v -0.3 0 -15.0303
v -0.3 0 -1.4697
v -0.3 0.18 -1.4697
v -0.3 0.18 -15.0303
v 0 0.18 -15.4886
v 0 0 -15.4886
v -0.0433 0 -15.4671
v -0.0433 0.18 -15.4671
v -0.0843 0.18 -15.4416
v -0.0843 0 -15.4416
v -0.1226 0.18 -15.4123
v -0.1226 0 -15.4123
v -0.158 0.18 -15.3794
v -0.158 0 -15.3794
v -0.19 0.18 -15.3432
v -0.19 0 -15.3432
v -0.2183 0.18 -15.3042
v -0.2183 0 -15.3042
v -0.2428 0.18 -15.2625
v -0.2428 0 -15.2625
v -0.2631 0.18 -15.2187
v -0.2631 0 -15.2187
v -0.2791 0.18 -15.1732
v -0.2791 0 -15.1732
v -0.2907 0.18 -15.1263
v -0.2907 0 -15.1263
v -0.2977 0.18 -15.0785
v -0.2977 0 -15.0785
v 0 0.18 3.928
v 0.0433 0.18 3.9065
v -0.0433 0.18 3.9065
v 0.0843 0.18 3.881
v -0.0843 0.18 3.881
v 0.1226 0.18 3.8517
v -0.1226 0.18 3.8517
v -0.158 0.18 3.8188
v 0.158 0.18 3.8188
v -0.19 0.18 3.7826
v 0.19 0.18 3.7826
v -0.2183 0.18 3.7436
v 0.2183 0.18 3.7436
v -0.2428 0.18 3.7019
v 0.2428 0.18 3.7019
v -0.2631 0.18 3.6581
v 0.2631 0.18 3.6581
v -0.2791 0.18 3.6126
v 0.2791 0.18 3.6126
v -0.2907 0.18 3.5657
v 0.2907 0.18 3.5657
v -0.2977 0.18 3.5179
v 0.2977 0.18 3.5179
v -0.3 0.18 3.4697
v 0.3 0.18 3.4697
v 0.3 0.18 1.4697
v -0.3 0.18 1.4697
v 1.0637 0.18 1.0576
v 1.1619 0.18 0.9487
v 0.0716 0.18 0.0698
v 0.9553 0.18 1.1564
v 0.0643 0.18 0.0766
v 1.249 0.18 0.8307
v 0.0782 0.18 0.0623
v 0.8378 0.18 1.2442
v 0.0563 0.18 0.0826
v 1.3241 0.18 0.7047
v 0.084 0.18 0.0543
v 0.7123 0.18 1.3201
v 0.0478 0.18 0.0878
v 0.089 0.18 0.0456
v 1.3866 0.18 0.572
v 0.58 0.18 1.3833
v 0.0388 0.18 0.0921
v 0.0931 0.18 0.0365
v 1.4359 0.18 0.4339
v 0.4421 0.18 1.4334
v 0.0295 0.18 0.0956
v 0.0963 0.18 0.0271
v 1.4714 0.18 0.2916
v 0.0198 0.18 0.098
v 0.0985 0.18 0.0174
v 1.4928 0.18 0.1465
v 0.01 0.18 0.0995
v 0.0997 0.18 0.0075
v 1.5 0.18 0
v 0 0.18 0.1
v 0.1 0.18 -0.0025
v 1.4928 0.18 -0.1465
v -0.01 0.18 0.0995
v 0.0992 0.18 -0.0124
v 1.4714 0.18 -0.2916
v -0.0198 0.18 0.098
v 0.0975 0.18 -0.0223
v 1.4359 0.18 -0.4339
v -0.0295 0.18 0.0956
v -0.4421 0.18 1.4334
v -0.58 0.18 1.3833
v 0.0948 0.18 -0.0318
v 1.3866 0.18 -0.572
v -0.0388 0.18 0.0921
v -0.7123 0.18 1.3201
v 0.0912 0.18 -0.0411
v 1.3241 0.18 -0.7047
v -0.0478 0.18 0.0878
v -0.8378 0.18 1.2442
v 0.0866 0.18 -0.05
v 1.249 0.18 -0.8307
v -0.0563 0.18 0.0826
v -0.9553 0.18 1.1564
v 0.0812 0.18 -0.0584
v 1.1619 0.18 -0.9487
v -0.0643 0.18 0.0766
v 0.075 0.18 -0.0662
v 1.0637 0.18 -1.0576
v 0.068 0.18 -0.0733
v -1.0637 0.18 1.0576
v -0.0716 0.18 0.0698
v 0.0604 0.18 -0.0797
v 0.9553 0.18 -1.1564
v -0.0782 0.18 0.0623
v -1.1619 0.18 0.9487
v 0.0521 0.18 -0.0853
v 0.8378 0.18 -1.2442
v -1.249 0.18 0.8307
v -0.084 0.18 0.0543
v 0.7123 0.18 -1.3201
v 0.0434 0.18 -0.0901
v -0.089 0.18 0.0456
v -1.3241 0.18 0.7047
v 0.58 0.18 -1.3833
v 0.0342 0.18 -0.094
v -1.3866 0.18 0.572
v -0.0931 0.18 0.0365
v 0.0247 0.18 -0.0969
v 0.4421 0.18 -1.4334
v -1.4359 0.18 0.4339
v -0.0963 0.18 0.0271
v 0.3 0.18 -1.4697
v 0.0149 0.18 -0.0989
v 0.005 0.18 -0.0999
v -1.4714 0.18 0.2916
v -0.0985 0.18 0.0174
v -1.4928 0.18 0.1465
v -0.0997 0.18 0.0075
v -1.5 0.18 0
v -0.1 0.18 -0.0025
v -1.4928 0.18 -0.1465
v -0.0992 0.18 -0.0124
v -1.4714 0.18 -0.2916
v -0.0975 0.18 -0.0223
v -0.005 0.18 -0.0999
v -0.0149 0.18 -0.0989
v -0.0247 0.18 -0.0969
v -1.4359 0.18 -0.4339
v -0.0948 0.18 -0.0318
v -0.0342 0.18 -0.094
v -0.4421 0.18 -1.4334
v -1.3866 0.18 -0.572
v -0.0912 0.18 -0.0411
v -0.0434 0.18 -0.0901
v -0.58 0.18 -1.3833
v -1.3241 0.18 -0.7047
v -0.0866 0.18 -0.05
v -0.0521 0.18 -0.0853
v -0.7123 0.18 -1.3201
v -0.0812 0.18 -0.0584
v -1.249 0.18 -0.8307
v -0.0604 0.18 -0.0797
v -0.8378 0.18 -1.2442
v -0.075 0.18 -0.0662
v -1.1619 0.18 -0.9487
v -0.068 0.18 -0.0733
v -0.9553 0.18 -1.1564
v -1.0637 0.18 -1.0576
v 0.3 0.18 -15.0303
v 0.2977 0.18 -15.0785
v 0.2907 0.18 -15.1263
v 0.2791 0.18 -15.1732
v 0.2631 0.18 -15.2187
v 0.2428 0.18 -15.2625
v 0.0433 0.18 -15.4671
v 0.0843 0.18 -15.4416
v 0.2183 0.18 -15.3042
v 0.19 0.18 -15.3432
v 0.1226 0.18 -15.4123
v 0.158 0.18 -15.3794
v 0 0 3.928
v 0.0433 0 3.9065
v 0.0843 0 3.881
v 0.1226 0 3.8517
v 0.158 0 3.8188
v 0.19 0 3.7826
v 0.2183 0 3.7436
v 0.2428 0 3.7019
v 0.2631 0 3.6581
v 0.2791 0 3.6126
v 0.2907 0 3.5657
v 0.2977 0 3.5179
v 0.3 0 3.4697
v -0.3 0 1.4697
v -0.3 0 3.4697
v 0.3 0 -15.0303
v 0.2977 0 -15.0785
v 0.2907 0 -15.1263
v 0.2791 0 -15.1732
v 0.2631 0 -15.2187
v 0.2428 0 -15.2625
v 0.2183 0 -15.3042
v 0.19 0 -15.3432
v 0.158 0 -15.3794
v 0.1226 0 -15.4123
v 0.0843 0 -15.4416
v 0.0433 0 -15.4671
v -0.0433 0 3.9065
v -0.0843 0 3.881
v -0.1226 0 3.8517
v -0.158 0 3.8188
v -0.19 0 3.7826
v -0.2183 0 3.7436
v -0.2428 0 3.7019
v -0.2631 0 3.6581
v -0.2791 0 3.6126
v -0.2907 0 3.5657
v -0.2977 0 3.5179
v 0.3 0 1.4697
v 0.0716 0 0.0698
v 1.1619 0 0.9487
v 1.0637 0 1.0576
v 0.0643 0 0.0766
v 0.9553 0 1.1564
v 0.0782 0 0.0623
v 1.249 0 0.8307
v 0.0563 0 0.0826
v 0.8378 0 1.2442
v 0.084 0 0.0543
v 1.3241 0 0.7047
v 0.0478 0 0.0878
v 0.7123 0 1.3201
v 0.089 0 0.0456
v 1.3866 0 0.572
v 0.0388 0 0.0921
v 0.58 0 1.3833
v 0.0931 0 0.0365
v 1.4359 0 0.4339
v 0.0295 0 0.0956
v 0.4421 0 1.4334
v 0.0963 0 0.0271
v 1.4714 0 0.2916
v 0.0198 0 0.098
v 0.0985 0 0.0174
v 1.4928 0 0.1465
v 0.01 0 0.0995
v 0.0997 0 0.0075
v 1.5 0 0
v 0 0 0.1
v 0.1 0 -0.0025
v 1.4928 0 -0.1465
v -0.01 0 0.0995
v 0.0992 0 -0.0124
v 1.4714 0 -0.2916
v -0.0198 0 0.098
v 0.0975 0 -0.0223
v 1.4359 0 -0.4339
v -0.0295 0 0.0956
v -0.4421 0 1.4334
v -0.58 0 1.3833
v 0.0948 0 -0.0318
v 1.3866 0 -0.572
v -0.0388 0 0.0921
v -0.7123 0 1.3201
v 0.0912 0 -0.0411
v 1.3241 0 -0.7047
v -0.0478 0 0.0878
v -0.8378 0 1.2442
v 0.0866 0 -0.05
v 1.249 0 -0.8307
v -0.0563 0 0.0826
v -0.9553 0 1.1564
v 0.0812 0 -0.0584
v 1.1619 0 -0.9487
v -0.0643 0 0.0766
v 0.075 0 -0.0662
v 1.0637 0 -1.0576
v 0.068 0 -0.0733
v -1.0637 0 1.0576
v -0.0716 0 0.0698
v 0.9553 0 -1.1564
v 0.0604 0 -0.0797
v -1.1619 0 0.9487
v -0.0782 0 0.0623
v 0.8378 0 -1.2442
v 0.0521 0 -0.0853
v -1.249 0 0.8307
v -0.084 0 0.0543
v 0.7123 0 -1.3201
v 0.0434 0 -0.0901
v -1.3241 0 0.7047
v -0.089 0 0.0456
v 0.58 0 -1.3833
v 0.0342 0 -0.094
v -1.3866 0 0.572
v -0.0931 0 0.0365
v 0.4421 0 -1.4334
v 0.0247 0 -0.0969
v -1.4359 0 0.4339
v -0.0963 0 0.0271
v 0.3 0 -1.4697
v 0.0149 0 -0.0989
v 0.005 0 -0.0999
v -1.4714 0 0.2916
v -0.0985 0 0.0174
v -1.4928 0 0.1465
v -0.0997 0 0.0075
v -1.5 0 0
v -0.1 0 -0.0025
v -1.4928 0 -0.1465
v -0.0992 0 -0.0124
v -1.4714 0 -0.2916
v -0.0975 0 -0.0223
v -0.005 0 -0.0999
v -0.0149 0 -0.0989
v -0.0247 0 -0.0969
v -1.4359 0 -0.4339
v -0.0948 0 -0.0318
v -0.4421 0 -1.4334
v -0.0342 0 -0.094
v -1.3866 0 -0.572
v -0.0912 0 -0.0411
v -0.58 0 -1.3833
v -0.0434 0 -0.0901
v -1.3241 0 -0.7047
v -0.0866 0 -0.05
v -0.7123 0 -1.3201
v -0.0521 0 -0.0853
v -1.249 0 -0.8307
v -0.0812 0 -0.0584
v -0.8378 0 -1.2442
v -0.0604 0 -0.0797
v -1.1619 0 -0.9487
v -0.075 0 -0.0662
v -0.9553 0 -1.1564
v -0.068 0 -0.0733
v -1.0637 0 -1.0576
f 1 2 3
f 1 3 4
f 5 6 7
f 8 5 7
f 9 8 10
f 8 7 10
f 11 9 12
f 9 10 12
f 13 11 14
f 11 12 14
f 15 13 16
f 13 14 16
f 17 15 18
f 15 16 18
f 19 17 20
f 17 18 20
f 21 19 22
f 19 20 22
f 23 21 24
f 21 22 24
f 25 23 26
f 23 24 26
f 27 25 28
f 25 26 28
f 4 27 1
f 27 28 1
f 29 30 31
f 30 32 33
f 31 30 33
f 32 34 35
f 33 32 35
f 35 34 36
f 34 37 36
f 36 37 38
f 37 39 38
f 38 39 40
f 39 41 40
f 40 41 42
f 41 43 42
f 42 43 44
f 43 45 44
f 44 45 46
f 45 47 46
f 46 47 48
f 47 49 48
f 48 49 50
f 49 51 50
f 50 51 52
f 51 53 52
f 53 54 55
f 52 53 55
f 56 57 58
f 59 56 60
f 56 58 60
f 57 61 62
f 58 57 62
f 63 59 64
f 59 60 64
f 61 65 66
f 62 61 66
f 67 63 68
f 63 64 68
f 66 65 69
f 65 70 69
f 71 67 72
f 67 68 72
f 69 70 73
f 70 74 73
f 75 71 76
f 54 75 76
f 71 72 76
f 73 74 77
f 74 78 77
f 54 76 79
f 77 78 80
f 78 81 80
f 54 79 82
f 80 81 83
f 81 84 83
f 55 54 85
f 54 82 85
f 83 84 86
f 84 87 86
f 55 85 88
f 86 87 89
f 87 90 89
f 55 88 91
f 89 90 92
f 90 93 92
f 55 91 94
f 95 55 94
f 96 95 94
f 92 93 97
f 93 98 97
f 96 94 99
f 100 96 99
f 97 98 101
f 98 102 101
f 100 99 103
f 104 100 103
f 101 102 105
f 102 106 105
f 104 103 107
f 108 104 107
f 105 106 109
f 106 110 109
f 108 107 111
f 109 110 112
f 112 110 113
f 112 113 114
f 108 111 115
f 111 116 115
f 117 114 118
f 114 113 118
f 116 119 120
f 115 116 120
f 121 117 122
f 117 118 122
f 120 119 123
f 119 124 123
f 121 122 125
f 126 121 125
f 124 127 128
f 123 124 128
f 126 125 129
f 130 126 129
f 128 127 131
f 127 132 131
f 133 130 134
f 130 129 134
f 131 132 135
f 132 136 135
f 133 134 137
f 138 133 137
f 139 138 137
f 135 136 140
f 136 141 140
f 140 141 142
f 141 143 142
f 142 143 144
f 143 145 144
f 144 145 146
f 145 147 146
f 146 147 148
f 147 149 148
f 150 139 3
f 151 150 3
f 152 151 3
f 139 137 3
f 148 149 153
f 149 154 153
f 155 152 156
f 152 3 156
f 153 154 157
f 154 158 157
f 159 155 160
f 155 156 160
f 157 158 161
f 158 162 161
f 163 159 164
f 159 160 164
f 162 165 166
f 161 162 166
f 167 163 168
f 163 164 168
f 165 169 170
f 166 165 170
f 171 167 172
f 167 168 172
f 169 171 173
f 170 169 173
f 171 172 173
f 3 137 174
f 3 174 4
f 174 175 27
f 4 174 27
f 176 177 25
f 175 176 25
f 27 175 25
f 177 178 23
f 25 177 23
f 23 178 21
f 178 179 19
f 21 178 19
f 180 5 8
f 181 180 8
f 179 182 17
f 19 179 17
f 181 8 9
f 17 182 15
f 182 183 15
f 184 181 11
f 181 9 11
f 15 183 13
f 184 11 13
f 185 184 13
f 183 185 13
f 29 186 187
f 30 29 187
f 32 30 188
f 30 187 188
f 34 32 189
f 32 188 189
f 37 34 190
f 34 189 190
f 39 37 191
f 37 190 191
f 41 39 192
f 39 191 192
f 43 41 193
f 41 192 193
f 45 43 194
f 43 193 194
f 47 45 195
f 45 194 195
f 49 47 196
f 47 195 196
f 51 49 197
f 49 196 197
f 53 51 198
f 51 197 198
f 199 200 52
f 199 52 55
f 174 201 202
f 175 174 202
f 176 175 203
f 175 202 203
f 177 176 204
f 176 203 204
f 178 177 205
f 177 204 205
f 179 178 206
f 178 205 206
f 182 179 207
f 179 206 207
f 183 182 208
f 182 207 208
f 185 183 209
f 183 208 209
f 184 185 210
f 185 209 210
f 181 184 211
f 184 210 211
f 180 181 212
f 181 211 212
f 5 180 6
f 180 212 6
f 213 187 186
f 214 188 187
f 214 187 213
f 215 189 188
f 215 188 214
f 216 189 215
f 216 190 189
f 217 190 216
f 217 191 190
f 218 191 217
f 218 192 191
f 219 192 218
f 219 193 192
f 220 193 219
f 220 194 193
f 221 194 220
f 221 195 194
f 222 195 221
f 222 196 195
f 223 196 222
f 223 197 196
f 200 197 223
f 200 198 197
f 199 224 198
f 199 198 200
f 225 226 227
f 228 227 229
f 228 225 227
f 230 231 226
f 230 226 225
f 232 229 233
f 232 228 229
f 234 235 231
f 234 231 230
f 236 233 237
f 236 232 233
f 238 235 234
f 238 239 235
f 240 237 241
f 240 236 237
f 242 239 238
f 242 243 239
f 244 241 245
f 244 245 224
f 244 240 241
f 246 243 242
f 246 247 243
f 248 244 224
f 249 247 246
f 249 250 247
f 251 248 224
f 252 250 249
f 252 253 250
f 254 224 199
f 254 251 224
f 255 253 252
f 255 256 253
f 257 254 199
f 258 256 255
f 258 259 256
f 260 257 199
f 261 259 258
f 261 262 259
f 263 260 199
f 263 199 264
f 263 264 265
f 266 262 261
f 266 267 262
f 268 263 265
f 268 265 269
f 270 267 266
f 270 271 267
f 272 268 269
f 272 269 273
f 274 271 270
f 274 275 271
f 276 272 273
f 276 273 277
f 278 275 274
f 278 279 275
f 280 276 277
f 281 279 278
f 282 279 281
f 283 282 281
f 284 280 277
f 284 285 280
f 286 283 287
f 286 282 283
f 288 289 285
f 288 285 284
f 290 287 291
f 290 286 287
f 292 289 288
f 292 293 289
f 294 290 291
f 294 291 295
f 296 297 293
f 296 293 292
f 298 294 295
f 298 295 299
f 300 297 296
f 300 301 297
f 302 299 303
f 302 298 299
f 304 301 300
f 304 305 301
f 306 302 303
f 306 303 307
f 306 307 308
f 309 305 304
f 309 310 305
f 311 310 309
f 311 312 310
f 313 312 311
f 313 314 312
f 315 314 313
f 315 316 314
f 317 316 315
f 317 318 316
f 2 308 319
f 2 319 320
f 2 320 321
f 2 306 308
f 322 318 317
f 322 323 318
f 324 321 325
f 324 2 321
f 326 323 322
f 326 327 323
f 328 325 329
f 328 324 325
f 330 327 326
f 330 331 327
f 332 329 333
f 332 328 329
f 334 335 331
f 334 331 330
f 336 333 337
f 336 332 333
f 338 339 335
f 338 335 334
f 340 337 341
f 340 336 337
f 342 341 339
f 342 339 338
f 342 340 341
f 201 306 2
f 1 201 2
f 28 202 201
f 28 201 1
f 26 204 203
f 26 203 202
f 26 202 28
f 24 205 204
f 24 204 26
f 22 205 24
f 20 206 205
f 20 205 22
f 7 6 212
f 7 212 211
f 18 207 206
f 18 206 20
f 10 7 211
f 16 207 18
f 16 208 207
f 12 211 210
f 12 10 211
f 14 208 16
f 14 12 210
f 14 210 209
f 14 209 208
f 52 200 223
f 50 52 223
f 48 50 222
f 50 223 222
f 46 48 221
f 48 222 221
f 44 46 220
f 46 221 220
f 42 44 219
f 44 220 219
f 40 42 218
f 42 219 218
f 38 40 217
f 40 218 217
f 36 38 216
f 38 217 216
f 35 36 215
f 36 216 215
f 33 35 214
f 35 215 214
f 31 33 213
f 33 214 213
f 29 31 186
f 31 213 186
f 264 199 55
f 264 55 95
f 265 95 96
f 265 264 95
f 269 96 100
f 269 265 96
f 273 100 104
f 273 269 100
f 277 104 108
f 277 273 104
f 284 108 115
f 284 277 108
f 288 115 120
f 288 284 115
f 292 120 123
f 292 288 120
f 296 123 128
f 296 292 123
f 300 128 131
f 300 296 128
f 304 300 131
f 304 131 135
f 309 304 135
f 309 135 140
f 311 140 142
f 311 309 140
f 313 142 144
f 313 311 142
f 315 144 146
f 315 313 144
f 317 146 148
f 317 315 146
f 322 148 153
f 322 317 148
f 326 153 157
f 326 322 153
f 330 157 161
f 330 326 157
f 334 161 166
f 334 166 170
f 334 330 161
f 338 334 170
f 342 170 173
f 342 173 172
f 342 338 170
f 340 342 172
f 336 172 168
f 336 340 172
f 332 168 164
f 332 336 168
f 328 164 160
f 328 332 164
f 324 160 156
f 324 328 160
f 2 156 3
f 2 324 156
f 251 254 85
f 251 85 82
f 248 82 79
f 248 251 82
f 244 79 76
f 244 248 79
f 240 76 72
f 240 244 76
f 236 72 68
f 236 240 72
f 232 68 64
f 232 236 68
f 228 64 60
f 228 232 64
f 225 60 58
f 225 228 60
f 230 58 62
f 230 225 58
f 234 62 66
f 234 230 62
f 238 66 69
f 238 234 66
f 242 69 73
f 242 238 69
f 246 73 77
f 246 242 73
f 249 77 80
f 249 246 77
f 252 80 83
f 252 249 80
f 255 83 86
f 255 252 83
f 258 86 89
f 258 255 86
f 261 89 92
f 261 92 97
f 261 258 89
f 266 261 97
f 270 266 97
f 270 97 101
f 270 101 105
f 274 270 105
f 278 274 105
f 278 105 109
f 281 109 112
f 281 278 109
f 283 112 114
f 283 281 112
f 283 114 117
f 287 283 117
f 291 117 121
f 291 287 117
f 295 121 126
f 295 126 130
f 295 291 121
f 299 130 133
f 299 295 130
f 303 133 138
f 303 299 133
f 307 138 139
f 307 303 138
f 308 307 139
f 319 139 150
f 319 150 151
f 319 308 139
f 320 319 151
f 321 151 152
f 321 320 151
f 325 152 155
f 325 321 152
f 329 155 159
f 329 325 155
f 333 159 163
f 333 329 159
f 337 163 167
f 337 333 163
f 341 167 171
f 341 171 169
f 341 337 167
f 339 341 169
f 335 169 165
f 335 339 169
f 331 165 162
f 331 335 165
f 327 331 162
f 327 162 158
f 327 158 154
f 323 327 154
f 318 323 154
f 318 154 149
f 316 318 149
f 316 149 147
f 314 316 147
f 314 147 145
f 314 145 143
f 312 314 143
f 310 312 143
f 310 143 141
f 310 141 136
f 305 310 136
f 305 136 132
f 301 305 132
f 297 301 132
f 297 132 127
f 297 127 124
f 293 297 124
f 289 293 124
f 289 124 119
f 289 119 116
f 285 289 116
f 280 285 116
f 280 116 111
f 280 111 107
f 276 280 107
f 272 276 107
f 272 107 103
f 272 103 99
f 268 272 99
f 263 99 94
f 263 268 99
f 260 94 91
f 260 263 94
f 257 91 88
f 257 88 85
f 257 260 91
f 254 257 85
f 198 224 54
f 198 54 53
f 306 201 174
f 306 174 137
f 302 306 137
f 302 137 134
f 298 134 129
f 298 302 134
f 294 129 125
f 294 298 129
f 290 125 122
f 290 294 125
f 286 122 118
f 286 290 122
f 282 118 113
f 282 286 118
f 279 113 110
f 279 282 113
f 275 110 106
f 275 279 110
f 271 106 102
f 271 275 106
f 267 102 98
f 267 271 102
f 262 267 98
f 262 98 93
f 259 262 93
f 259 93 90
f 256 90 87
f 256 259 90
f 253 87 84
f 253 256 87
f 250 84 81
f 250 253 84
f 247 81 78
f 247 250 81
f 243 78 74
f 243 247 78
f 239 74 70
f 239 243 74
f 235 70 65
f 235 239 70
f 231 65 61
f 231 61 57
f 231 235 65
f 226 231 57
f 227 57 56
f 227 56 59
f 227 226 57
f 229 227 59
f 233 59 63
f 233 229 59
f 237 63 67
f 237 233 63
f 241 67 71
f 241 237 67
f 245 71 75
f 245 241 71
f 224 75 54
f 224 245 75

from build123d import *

# Parameters (mm, degrees)
SKETCH1_R           = 0.1
BOSS_EXTRUDE1_DEPTH = 0.18
FILLET2_R           = 0.5


with BuildPart() as part:
    # Sketch1 → Boss-Extrude1 (new body)
    with BuildSketch(Plane(origin=(0, 0, 0), x_dir=(1, 0, 0), z_dir=(0, 1, 0))):
        with BuildLine():
            Line((-0.3, -3.969693846), (-0.3, -1.469693846))
            ThreePointArc((-0.3, -1.469693846), (-1.5, 0), (-0.3, 1.469693846))
            Line((-0.3, 1.469693846), (-0.3, 15.530306154))
            Line((-0.3, 15.530306154), (0.3, 15.530306154))
            Line((0.3, 15.530306154), (0.3, 1.469693846))
            ThreePointArc((0.3, 1.469693846), (1.5, 0), (0.3, -1.469693846))
            Line((0.3, -1.469693846), (0.3, -3.969693846))
            Line((0.3, -3.969693846), (-0.3, -3.969693846))
        make_face()
        with Locations(Location((0, 0, 0), (0, 0, 270))):
            Circle(SKETCH1_R, mode=Mode.SUBTRACT)
    extrude(amount=BOSS_EXTRUDE1_DEPTH)

    # Fillet2
    # the kernel refuses this fillet: 0.5 mm, written as the material it takes off along each edge
    with BuildSketch(Plane(origin=(-0.3, -1.25, -15.530306154), x_dir=(0, 0, 1), z_dir=(0, 1, 0)), Plane(origin=(0.3, -1.25, -15.530306154), x_dir=(-1, 0, 0), z_dir=(0, 1, 0)), Plane(origin=(-0.3, -1.25, 3.969693846), x_dir=(1, 0, 0), z_dir=(0, 1, 0)), Plane(origin=(0.3, -1.25, 3.969693846), x_dir=(0, 0, -1), z_dir=(0, 1, 0))) as fillet2_piece_1:
        with BuildLine():
            CenterArc((FILLET2_R, FILLET2_R), FILLET2_R, 180, 90)
            Line((0, FILLET2_R), (0, 0))
            Line((0, 0), (FILLET2_R, 0))
        make_face()
    extrude(amount=2.68, mode=Mode.SUBTRACT)


solid = part.part
